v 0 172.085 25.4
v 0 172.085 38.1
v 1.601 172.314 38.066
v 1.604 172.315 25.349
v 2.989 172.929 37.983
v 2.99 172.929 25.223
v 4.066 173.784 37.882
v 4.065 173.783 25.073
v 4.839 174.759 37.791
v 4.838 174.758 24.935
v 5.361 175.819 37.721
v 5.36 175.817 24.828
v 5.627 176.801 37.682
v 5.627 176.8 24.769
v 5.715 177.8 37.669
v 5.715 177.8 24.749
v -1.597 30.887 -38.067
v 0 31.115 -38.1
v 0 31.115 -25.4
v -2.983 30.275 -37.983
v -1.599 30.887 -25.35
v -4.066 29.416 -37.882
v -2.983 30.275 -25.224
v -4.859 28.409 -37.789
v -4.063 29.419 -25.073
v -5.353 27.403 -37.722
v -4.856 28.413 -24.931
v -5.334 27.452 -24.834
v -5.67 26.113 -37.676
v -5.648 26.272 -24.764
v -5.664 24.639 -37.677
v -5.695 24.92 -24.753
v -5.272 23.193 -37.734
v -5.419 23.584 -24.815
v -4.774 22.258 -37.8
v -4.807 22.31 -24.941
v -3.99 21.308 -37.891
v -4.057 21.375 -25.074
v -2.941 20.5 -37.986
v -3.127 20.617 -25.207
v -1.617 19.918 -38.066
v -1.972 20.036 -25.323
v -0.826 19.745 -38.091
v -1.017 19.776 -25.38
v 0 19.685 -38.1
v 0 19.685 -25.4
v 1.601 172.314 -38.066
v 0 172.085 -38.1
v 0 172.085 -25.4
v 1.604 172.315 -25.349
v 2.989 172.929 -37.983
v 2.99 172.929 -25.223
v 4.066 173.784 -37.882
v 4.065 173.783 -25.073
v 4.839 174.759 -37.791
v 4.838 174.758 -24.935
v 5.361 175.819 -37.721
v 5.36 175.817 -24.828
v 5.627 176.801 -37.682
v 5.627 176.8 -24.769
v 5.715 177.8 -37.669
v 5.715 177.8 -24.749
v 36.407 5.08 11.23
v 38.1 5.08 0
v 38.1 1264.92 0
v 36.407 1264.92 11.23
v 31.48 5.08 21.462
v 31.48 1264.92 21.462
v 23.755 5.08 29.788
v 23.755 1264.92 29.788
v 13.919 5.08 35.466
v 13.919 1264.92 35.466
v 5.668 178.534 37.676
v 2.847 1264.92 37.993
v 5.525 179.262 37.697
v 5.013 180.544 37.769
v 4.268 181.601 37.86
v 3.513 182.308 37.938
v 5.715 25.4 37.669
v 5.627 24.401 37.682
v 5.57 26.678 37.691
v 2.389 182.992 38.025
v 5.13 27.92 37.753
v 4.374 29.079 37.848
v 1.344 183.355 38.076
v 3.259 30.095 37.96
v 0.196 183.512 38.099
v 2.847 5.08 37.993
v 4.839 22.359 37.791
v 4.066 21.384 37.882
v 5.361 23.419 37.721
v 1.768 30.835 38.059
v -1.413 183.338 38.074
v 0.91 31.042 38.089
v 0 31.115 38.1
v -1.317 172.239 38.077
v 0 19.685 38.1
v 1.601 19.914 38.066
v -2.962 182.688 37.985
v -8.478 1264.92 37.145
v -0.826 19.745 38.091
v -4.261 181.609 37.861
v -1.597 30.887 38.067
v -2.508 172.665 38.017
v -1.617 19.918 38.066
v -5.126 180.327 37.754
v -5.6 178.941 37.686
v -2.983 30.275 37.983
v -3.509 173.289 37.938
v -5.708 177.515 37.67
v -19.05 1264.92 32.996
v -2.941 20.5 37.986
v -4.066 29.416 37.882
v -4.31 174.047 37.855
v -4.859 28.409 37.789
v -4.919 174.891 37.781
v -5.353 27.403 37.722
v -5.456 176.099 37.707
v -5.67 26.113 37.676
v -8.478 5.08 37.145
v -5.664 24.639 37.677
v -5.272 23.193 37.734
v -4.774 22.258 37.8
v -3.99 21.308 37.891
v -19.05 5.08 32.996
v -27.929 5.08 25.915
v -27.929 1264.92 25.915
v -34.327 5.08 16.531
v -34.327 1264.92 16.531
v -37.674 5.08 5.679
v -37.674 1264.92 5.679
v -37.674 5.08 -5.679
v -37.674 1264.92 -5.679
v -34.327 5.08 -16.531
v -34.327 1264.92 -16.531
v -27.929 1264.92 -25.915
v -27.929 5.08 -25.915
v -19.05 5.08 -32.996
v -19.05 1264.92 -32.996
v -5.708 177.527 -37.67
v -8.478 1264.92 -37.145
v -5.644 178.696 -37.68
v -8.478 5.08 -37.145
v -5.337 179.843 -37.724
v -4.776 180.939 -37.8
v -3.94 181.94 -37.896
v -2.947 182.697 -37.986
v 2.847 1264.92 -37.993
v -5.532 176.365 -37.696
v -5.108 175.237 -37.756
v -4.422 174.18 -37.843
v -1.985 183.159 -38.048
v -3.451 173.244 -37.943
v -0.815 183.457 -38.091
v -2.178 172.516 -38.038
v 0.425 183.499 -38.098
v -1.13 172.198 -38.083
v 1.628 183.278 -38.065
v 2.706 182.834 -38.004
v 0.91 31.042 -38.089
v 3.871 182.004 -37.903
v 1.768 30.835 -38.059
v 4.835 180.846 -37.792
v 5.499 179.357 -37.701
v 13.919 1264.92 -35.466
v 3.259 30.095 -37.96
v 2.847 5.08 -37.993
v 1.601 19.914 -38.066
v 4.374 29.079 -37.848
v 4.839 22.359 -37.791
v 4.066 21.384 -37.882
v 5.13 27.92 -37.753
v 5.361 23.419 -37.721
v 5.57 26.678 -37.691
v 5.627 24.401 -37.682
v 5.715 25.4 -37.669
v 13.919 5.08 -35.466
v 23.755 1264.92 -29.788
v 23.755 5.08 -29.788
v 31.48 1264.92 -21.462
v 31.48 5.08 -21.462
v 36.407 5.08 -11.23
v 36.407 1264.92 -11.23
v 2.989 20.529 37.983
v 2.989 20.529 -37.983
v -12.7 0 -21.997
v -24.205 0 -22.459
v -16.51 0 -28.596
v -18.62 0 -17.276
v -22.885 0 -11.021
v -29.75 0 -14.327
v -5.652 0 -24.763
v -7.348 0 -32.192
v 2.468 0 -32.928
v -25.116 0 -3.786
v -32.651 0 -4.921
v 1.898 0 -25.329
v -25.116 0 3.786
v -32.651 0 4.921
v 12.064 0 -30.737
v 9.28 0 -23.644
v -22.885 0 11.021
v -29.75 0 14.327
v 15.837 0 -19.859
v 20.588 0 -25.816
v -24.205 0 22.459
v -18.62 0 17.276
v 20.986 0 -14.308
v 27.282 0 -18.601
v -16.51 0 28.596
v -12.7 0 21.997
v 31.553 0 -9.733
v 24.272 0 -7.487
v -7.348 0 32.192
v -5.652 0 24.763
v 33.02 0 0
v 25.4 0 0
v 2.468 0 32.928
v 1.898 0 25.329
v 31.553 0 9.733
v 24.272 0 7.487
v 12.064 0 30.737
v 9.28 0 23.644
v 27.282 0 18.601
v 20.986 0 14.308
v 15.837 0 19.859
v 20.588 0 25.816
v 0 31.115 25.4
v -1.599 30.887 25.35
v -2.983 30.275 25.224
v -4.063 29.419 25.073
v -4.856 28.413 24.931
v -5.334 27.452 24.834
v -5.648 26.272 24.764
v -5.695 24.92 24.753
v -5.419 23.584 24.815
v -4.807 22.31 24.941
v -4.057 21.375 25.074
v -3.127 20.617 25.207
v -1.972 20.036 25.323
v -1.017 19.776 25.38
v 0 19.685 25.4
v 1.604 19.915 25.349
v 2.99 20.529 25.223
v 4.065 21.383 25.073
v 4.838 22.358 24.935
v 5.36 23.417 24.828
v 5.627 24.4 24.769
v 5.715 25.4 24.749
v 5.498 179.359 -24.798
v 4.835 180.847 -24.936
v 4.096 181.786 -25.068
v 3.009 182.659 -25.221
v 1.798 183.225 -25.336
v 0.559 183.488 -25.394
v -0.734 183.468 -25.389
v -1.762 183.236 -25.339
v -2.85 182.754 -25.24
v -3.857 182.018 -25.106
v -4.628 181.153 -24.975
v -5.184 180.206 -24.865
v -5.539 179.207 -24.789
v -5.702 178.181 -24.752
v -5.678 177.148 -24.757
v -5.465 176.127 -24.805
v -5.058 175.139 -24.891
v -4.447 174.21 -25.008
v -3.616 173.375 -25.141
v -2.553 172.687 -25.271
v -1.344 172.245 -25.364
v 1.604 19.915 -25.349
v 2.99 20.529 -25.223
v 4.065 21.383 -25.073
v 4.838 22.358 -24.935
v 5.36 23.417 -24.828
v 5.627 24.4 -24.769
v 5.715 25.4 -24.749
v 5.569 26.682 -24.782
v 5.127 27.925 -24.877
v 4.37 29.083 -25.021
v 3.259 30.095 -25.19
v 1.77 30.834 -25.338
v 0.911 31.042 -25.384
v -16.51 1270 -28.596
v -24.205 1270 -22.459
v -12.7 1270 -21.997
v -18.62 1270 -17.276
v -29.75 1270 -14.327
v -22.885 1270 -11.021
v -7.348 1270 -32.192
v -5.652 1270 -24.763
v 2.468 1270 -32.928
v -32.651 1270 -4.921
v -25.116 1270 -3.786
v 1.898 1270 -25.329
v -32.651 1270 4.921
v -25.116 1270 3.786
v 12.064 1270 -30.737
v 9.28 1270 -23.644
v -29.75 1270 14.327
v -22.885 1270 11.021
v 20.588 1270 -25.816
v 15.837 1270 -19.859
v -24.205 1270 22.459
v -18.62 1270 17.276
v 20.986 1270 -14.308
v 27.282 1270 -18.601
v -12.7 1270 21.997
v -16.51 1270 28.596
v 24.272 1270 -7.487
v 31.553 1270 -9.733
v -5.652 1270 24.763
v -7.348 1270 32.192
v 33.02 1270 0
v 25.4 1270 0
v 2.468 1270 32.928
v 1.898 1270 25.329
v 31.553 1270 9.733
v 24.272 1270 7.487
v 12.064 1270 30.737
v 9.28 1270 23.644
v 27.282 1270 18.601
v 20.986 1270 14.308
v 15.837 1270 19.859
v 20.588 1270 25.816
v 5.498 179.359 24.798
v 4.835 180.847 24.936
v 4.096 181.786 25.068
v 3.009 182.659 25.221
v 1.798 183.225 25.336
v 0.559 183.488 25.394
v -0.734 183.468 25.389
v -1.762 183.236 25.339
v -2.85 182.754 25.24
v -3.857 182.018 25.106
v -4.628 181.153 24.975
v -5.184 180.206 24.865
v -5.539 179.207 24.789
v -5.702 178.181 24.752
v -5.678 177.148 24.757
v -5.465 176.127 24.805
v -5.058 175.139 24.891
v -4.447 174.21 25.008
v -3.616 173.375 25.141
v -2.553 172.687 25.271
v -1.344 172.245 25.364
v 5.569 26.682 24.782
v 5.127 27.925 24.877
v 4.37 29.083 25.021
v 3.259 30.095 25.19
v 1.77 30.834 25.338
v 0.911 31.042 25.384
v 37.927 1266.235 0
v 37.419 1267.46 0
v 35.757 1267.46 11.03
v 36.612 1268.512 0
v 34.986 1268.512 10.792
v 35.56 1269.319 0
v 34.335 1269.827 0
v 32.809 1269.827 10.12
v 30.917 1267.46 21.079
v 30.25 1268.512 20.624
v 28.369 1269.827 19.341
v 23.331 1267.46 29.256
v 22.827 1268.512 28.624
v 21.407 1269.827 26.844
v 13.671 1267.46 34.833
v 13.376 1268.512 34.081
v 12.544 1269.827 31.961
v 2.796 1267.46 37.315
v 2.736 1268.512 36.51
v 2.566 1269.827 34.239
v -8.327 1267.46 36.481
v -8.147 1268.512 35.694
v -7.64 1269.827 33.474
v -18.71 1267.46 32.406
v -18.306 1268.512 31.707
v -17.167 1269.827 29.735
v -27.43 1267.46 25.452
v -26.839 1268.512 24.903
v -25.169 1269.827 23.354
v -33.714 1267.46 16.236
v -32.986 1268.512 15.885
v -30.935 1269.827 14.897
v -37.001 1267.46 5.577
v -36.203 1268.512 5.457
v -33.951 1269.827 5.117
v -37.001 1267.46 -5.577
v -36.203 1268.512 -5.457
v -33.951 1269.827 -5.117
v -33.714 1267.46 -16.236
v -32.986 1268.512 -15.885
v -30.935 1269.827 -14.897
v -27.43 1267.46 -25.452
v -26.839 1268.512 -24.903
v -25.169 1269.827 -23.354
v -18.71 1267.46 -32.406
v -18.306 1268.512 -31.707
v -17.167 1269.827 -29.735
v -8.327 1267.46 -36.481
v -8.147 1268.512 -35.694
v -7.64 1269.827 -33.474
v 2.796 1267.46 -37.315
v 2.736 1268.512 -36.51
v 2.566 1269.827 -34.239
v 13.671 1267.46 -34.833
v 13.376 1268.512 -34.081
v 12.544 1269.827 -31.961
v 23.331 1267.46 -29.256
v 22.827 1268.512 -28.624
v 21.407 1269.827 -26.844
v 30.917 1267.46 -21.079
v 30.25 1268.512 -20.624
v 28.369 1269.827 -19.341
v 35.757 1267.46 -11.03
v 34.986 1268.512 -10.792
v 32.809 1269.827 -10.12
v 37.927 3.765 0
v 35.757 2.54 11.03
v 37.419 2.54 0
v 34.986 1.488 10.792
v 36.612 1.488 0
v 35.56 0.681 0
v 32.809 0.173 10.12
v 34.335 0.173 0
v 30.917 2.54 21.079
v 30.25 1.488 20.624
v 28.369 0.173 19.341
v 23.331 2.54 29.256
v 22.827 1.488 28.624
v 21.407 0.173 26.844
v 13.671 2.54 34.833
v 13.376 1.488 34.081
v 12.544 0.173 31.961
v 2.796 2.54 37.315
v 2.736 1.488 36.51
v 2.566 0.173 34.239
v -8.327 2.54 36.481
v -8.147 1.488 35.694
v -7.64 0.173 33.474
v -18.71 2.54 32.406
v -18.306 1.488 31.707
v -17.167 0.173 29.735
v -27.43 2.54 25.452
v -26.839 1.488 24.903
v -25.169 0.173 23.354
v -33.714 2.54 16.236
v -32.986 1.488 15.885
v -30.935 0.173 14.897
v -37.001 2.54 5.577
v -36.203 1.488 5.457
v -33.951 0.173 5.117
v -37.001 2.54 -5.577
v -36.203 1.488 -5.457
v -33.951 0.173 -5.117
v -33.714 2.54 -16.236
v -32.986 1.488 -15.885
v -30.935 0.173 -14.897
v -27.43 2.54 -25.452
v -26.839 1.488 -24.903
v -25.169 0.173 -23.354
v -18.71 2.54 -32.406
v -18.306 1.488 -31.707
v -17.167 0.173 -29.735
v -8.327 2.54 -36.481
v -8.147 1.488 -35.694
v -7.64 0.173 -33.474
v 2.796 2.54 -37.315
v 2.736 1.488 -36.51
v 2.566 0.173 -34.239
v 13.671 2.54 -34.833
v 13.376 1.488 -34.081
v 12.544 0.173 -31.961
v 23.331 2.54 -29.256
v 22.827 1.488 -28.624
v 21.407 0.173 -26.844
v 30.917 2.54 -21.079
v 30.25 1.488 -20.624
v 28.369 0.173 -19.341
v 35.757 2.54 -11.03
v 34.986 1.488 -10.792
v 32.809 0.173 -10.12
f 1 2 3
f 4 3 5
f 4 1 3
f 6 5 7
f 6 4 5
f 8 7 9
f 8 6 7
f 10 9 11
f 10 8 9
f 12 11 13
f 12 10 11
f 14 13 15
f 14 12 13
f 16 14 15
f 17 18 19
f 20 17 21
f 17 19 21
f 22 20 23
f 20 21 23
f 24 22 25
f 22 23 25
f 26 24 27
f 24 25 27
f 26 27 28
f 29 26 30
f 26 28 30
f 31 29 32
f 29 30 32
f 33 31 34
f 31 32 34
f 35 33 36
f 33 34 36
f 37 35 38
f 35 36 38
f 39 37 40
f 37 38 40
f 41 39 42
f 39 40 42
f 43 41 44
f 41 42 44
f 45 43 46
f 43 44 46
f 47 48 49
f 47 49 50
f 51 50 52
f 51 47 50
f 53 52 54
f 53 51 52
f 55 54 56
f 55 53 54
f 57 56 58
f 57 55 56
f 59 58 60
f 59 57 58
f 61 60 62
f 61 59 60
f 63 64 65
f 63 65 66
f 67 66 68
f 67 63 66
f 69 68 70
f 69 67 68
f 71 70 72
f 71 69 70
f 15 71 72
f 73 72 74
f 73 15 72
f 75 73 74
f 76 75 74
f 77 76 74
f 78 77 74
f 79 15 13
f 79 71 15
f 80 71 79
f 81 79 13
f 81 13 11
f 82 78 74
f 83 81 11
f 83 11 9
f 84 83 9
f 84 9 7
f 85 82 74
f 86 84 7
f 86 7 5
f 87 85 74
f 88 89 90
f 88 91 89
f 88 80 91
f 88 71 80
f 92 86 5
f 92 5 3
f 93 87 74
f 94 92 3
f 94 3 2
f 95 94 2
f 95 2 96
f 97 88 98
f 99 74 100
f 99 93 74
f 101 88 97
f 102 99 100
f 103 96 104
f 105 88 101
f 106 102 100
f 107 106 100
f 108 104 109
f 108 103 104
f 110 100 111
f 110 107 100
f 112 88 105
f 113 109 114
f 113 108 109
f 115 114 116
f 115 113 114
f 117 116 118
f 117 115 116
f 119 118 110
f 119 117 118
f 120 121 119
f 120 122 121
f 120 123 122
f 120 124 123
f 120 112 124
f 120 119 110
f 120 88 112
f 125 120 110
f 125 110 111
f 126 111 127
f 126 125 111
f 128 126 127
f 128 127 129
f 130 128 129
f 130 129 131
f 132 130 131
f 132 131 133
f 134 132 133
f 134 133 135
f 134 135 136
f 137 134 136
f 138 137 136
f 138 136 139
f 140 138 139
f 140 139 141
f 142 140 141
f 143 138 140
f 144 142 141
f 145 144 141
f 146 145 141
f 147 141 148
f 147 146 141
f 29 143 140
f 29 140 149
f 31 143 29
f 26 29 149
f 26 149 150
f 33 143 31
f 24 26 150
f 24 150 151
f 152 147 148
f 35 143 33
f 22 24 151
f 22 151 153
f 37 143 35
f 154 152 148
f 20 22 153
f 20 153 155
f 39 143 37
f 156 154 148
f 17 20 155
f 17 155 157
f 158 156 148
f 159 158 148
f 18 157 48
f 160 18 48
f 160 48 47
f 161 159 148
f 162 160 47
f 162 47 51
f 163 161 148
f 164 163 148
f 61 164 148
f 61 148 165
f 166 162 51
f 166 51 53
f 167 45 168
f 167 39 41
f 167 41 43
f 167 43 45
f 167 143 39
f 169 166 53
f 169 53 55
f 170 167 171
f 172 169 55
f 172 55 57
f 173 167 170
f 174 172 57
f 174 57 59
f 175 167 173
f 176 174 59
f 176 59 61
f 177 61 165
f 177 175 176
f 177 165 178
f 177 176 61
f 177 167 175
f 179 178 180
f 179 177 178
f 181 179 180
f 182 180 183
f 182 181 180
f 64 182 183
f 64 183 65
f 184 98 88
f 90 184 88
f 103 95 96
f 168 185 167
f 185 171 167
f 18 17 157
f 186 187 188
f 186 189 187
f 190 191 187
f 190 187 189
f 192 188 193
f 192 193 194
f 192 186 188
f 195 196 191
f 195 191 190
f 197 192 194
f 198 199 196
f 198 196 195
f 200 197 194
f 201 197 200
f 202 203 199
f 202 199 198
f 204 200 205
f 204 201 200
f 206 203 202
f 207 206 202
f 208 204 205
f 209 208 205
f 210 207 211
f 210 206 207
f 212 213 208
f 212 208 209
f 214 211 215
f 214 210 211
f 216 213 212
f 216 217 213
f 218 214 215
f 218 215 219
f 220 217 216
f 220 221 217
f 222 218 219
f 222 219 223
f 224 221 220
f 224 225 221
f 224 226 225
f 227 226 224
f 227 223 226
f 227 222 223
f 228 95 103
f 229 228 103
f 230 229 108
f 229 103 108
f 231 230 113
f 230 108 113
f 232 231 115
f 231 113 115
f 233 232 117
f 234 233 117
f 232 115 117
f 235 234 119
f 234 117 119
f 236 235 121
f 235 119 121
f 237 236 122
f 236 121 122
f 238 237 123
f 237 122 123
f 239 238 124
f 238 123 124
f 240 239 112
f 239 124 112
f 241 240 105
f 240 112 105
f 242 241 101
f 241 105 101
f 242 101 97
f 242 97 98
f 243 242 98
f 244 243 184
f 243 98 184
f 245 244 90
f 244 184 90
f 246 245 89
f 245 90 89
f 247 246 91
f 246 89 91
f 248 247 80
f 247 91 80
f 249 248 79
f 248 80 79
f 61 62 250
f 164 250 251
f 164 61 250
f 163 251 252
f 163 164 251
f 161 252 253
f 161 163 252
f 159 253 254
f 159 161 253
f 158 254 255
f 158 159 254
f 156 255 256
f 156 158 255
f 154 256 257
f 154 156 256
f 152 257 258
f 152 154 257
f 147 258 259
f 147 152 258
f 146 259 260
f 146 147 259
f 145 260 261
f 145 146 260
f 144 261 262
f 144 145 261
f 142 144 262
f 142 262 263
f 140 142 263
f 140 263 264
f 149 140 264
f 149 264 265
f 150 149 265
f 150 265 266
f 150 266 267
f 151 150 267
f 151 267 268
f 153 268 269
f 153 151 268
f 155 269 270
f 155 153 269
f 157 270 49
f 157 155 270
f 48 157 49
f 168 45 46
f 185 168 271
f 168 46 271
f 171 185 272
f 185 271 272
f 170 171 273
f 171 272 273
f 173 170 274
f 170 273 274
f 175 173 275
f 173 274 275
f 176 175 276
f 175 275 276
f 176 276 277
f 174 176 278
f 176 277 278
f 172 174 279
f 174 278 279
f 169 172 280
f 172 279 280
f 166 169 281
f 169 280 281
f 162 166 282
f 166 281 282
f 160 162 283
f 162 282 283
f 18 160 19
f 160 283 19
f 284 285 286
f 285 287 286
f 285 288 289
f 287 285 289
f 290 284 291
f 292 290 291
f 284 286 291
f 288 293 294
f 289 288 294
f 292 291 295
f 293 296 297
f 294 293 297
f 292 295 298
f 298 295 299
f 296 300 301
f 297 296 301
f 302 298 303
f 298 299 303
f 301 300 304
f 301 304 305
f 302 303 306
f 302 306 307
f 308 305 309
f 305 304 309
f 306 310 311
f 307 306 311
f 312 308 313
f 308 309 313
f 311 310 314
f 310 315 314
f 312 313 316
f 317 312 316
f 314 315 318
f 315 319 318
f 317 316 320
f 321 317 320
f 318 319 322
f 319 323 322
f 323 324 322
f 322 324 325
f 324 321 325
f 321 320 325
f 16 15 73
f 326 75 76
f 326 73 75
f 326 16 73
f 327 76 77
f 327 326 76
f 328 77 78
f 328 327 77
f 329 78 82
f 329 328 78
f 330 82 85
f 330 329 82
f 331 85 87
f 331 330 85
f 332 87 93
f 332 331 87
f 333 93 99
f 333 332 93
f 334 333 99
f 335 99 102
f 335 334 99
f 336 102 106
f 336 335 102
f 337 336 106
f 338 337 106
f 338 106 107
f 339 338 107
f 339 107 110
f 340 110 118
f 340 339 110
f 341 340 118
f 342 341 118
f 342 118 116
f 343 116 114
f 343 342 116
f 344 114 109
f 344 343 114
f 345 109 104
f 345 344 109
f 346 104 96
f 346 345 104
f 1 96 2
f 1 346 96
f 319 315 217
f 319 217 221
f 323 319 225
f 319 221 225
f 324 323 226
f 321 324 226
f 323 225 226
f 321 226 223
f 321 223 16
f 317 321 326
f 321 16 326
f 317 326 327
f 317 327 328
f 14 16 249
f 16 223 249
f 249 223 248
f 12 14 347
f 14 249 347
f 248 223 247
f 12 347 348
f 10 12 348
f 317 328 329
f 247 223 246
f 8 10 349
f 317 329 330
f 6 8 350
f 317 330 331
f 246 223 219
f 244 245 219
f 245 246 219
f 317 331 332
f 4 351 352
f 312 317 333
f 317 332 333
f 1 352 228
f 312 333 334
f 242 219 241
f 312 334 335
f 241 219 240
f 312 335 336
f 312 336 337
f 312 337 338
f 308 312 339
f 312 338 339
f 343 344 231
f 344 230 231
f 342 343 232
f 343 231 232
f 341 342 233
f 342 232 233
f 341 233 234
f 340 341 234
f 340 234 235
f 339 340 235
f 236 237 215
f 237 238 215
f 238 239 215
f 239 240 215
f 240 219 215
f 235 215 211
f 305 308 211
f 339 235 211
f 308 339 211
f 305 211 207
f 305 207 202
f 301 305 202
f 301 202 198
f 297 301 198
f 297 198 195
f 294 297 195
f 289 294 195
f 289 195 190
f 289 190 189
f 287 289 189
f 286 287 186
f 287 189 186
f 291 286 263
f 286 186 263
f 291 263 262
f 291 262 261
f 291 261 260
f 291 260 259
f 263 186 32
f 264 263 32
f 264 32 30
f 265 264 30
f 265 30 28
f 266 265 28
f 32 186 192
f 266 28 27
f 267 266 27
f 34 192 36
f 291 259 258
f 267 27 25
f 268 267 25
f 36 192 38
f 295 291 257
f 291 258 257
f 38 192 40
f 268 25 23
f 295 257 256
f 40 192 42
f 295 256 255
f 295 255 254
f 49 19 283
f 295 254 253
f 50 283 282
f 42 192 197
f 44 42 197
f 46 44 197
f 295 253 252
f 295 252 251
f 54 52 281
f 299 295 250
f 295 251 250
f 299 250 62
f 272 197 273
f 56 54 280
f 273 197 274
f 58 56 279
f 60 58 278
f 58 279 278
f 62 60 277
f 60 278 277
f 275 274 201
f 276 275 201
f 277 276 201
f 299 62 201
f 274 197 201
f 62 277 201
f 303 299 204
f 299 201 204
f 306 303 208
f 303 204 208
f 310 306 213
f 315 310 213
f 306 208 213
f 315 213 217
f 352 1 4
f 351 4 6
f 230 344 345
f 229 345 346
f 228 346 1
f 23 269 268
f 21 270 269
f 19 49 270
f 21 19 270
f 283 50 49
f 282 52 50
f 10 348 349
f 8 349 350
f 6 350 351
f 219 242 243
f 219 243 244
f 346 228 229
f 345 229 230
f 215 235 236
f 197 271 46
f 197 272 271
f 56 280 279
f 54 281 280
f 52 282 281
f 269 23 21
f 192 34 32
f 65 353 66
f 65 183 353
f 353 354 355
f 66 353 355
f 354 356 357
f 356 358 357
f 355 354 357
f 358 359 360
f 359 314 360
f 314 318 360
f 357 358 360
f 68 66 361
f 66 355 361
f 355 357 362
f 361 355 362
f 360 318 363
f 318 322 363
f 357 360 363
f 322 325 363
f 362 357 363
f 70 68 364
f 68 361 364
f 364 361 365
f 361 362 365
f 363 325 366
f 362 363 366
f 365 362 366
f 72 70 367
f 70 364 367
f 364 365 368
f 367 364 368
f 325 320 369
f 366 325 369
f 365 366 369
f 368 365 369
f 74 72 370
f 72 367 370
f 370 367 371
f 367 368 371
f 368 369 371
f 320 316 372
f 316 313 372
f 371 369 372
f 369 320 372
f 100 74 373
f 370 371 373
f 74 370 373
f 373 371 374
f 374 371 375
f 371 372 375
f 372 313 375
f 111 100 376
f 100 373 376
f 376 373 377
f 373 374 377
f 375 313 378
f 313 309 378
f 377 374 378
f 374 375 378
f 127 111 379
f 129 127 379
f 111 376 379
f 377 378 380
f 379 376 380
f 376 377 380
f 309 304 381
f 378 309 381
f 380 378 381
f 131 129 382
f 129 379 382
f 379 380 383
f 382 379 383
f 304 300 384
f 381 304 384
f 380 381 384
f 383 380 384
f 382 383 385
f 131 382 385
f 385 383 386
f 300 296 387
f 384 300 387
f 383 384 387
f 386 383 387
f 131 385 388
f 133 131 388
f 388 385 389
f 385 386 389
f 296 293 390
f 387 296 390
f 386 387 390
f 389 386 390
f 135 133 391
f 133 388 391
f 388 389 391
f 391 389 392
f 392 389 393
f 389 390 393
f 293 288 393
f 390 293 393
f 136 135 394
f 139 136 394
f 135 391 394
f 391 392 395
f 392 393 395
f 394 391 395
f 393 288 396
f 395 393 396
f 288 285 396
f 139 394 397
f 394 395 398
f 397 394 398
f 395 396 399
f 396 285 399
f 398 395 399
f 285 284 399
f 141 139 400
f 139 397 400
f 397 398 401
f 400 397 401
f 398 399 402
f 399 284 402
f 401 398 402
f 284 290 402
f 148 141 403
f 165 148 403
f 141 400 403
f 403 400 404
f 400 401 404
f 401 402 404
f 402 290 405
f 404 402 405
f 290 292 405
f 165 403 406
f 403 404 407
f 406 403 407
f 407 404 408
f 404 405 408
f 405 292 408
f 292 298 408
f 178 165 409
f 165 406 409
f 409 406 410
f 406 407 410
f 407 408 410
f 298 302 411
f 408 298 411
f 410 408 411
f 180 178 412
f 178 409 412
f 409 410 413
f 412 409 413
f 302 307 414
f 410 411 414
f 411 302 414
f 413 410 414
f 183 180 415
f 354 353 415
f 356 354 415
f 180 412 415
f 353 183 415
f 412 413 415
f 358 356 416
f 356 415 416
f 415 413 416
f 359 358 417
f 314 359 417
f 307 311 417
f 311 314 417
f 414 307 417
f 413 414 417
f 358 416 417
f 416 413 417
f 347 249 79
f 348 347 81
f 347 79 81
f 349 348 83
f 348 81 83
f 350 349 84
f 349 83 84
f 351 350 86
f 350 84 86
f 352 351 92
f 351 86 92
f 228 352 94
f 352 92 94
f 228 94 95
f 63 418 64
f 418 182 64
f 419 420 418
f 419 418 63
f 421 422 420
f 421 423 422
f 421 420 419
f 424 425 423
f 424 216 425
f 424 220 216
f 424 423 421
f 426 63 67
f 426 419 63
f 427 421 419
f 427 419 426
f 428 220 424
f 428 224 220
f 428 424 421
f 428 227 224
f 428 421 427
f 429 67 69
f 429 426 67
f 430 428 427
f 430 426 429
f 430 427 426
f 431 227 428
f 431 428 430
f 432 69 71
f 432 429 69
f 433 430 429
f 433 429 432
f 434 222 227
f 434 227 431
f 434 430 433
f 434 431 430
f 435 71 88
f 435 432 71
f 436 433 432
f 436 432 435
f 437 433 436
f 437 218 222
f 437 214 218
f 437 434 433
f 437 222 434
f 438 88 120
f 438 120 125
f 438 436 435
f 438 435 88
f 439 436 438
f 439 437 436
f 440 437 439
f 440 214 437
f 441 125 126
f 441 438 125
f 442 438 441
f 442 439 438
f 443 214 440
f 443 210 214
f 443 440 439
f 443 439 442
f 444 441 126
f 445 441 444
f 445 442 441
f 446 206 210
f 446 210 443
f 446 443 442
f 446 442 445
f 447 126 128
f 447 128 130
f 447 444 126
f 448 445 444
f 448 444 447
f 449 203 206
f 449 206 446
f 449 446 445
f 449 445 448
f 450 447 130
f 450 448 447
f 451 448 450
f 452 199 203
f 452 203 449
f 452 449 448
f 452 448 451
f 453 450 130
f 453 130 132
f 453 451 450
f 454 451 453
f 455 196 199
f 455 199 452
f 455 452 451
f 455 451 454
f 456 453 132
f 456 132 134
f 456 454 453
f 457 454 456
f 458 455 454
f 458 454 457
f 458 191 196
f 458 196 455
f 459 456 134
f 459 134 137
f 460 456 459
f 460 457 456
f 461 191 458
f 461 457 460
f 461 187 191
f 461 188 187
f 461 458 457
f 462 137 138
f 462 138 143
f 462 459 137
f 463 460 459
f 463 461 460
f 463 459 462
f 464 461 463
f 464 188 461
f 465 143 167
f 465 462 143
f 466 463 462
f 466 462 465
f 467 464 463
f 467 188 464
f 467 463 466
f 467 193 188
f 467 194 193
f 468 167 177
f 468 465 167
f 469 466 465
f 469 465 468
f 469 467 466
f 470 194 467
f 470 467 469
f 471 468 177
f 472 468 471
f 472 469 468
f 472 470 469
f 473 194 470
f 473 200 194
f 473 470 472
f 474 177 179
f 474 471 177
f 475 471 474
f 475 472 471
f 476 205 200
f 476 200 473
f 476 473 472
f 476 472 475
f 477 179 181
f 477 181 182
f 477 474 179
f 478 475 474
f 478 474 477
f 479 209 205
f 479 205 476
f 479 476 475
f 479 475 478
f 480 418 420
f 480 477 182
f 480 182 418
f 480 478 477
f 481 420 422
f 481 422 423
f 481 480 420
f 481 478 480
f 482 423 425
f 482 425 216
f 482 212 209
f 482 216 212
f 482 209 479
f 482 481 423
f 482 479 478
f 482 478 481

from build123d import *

# Parameters (mm, degrees)
F0_R     = 38.1
F1_DEPTH = 1270
F2_R     = 25.4
F3_DEPTH = 1270.001
F4_R     = 5.08
F6_DEPTH = 38.1


with BuildPart() as f1:
    # F0 (on Front) → F1 (new body)
    with BuildSketch(Plane.XZ):
        Circle(F0_R)
    extrude(amount=-F1_DEPTH)

    # F2 (on face) → F3 (cut, through all)
    with BuildSketch(Plane.XZ):
        Circle(F2_R)
    extrude(amount=-F3_DEPTH, mode=Mode.SUBTRACT)

    # F4
    f4_edges = [f1.edges().sort_by_distance(p)[0] for p in [
        (-38.1, 0, 0),
        (-38.1, 1270, 0),
    ]]
    fillet(f4_edges, radius=F4_R)

    # F5 (on Top) → F6 (cut, symmetric)
    with BuildSketch(Plane.XY):
        with BuildLine():
            ThreePointArc((0, 172.085), (4.041115, 173.758885), (5.715, 177.8))
            ThreePointArc((5.715, 177.8), (-4.041115, 181.841115), (0, 172.085))
        make_face()
        with BuildLine():
            ThreePointArc((5.715, 25.4), (4.041115, 29.441115), (0, 31.115))
            ThreePointArc((0, 31.115), (-5.715, 25.4), (0, 19.685))
            ThreePointArc((0, 19.685), (4.041115, 21.358885), (5.715, 25.4))
        make_face()
    extrude(amount=F6_DEPTH, both=True, mode=Mode.SUBTRACT)


solid = f1.part
